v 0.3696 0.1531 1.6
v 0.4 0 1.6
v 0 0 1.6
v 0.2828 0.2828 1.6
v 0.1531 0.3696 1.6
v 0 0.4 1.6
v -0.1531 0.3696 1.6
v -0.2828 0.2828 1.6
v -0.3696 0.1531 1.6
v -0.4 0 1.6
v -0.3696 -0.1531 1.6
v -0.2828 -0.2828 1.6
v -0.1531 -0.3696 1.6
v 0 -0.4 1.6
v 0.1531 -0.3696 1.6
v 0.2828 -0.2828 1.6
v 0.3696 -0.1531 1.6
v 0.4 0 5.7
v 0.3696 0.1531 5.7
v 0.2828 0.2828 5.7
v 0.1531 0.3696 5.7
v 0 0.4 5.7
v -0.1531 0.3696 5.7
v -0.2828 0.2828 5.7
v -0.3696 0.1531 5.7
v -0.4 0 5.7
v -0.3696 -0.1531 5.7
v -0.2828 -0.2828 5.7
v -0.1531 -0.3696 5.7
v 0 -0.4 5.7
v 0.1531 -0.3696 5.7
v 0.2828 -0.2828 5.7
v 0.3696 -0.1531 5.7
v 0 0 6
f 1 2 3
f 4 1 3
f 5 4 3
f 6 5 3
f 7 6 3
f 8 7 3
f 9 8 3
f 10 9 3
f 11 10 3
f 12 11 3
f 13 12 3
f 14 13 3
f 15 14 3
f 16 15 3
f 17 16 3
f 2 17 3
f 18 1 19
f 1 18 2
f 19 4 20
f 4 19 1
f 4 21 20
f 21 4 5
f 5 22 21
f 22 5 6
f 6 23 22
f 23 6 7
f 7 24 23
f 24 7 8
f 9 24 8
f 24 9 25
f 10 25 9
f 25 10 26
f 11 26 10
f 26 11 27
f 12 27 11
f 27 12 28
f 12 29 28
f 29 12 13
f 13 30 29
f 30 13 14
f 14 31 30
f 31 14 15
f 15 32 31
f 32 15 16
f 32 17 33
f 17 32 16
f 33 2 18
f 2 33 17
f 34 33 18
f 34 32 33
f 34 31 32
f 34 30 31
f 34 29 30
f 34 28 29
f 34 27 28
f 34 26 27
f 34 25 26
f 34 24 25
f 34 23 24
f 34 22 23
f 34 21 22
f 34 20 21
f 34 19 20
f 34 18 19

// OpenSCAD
// file: ../p/4-4edge.scad
use <../lib.scad>
function ldraw_lib__4_4edge() = [
// 0 Circle 1.0
// 0 Name: 4-4edge.dat
// 0 Author: James Jessiman
// 0 !LDRAW_ORG Primitive UPDATE 2017-01
// 0 !LICENSE Licensed under CC BY 2.0 and CC BY 4.0 : see CAreadme.txt
// 
// 0 BFC CERTIFY CCW
  [0,"BFC","CERTIFY"],
  [0,"BFC","CCW"],
// 
// 0 !HISTORY 1998-12-15 [PTadmin] Official Update 1998-10
// 0 !HISTORY 2005-12-28 [PTadmin] Official Update 2005-01
// 0 !HISTORY 2007-06-24 [PTadmin] Header formatted for Contributor Agreement
// 0 !HISTORY 2008-07-01 [PTadmin] Official Update 2008-01
// 0 !HISTORY 2017-01-15 [Steffen] BFCed
// 0 !HISTORY 2017-12-30 [PTadmin] Official Update 2017-01
// 
// 
// 2 24 1 0 0 0.9239 0 0.3827
  [2,24,1,0,0,0.9239,0,0.3827],
// 2 24 0.9239 0 0.3827 0.7071 0 0.7071
  [2,24,0.9239,0,0.3827,0.7071,0,0.7071],
// 2 24 0.7071 0 0.7071 0.3827 0 0.9239
  [2,24,0.7071,0,0.7071,0.3827,0,0.9239],
// 2 24 0.3827 0 0.9239 0 0 1
  [2,24,0.3827,0,0.9239,0,0,1],
// 2 24 0 0 1 -0.3827 0 0.9239
  [2,24,0,0,1,-0.3827,0,0.9239],
// 2 24 -0.3827 0 0.9239 -0.7071 0 0.7071
  [2,24,-0.3827,0,0.9239,-0.7071,0,0.7071],
// 2 24 -0.7071 0 0.7071 -0.9239 0 0.3827
  [2,24,-0.7071,0,0.7071,-0.9239,0,0.3827],
// 2 24 -0.9239 0 0.3827 -1 0 -0
  [2,24,-0.9239,0,0.3827,-1,0,-0],
// 2 24 -1 0 -0 -0.9239 0 -0.3827
  [2,24,-1,0,-0,-0.9239,0,-0.3827],
// 2 24 -0.9239 0 -0.3827 -0.7071 0 -0.7071
  [2,24,-0.9239,0,-0.3827,-0.7071,0,-0.7071],
// 2 24 -0.7071 0 -0.7071 -0.3827 0 -0.9239
  [2,24,-0.7071,0,-0.7071,-0.3827,0,-0.9239],
// 2 24 -0.3827 0 -0.9239 0 0 -1
  [2,24,-0.3827,0,-0.9239,0,0,-1],
// 2 24 0 0 -1 0.3827 0 -0.9239
  [2,24,0,0,-1,0.3827,0,-0.9239],
// 2 24 0.3827 0 -0.9239 0.7071 0 -0.7071
  [2,24,0.3827,0,-0.9239,0.7071,0,-0.7071],
// 2 24 0.7071 0 -0.7071 0.9239 0 -0.3827
  [2,24,0.7071,0,-0.7071,0.9239,0,-0.3827],
// 2 24 0.9239 0 -0.3827 1 0 0
  [2,24,0.9239,0,-0.3827,1,0,0],
];
module ldraw_lib__4_4edge(step=0, col=false, unit=2/5, alt=false, line=0.2, solid=!$preview)
    makepoly(ldraw_lib__4_4edge(), step=step, col=col, unit=unit, alt=alt, line=line, solid=solid);
ldraw_lib__4_4edge(line=0.2);
// file: ../p/4-4disc.scad
use <../lib.scad>
function ldraw_lib__4_4disc() = [
// 0 Disc 1.0
// 0 Name: 4-4disc.dat
// 0 Author: James Jessiman
// 0 !LDRAW_ORG Primitive UPDATE 2002-02
// 0 !LICENSE Licensed under CC BY 2.0 and CC BY 4.0 : see CAreadme.txt
// 
// 0 BFC CERTIFY CCW
  [0,"BFC","CERTIFY"],
  [0,"BFC","CCW"],
// 
// 0 !HISTORY 1998-12-15 [PTadmin] Official Update 1998-10
// 0 !HISTORY 2002-03-23 [sbliss] Added BFC statement
// 0 !HISTORY 2002-04-25 [PTadmin] Official Update 2002-02
// 0 !HISTORY 2007-06-24 [PTadmin] Header formatted for Contributor Agreement
// 0 !HISTORY 2008-07-01 [PTadmin] Official Update 2008-01
// 
// 
// 3 16 0 0 0 1 0 0 0.9239 0 0.3827
  [3,16,0,0,0,1,0,0,0.9239,0,0.3827],
// 3 16 0 0 0 0.9239 0 0.3827 0.7071 0 0.7071
  [3,16,0,0,0,0.9239,0,0.3827,0.7071,0,0.7071],
// 3 16 0 0 0 0.7071 0 0.7071 0.3827 0 0.9239
  [3,16,0,0,0,0.7071,0,0.7071,0.3827,0,0.9239],
// 3 16 0 0 0 0.3827 0 0.9239 0 0 1
  [3,16,0,0,0,0.3827,0,0.9239,0,0,1],
// 3 16 0 0 0 0 0 1 -0.3827 0 0.9239
  [3,16,0,0,0,0,0,1,-0.3827,0,0.9239],
// 3 16 0 0 0 -0.3827 0 0.9239 -0.7071 0 0.7071
  [3,16,0,0,0,-0.3827,0,0.9239,-0.7071,0,0.7071],
// 3 16 0 0 0 -0.7071 0 0.7071 -0.9239 0 0.3827
  [3,16,0,0,0,-0.7071,0,0.7071,-0.9239,0,0.3827],
// 3 16 0 0 0 -0.9239 0 0.3827 -1 0 -0
  [3,16,0,0,0,-0.9239,0,0.3827,-1,0,-0],
// 3 16 0 0 0 -1 0 -0 -0.9239 0 -0.3827
  [3,16,0,0,0,-1,0,-0,-0.9239,0,-0.3827],
// 3 16 0 0 0 -0.9239 0 -0.3827 -0.7071 0 -0.7071
  [3,16,0,0,0,-0.9239,0,-0.3827,-0.7071,0,-0.7071],
// 3 16 0 0 0 -0.7071 0 -0.7071 -0.3827 0 -0.9239
  [3,16,0,0,0,-0.7071,0,-0.7071,-0.3827,0,-0.9239],
// 3 16 0 0 0 -0.3827 0 -0.9239 0 0 -1
  [3,16,0,0,0,-0.3827,0,-0.9239,0,0,-1],
// 3 16 0 0 0 0 0 -1 0.3827 0 -0.9239
  [3,16,0,0,0,0,0,-1,0.3827,0,-0.9239],
// 3 16 0 0 0 0.3827 0 -0.9239 0.7071 0 -0.7071
  [3,16,0,0,0,0.3827,0,-0.9239,0.7071,0,-0.7071],
// 3 16 0 0 0 0.7071 0 -0.7071 0.9239 0 -0.3827
  [3,16,0,0,0,0.7071,0,-0.7071,0.9239,0,-0.3827],
// 3 16 0 0 0 0.9239 0 -0.3827 1 0 0
  [3,16,0,0,0,0.9239,0,-0.3827,1,0,0],
// 0
];
module ldraw_lib__4_4disc(step=0, col=false, unit=2/5, alt=false, line=0.2, solid=!$preview)
    makepoly(ldraw_lib__4_4disc(), step=step, col=col, unit=unit, alt=alt, line=line, solid=solid);
ldraw_lib__4_4disc(line=0.2);
// file: ../p/4-4cyli.scad
use <../lib.scad>
function ldraw_lib__4_4cyli() = [
// 0 Cylinder 1.0
// 0 Name: 4-4cyli.dat
// 0 Author: James Jessiman
// 0 !LDRAW_ORG Primitive UPDATE 2005-01
// 0 !LICENSE Licensed under CC BY 2.0 and CC BY 4.0 : see CAreadme.txt
// 
// 0 BFC CERTIFY CCW
  [0,"BFC","CERTIFY"],
  [0,"BFC","CCW"],
// 
// 0 !HISTORY 1998-12-15 [PTadmin] Official Update 1998-10
// 0 !HISTORY 2002-03-23 [sbliss] Added BFC statement; merged headers from files in distributions LDraw 0.27 and Complete.
// 0 !HISTORY 2002-04-25 [PTadmin] Official Update 2002-02
// 0 !HISTORY 2004-12-14 [guyvivan] BFC CCW
// 0 !HISTORY 2005-12-28 [PTadmin] Official Update 2005-01
// 0 !HISTORY 2007-06-24 [PTadmin] Header formatted for Contributor Agreement
// 0 !HISTORY 2008-07-01 [PTadmin] Official Update 2008-01
// 
// 
// 4 16 1 1 0 0.9239 1 0.3827 0.9239 0 0.3827 1 0 0
  [4,16,1,1,0,0.9239,1,0.3827,0.9239,0,0.3827,1,0,0],
// 5 24 1 0 0 1 1 0 0.9239 0 0.3827 0.9239 0 -0.3827
  [5,24,1,0,0,1,1,0,0.9239,0,0.3827,0.9239,0,-0.3827],
// 4 16 0.9239 1 0.3827 0.7071 1 0.7071 0.7071 0 0.7071 0.9239 0 0.3827
  [4,16,0.9239,1,0.3827,0.7071,1,0.7071,0.7071,0,0.7071,0.9239,0,0.3827],
// 5 24 0.9239 0 0.3827 0.9239 1 0.3827 0.7071 0 0.7071 1 0 0
  [5,24,0.9239,0,0.3827,0.9239,1,0.3827,0.7071,0,0.7071,1,0,0],
// 4 16 0.7071 1 0.7071 0.3827 1 0.9239 0.3827 0 0.9239 0.7071 0 0.7071
  [4,16,0.7071,1,0.7071,0.3827,1,0.9239,0.3827,0,0.9239,0.7071,0,0.7071],
// 5 24 0.7071 0 0.7071 0.7071 1 0.7071 0.3827 0 0.9239 0.9239 0 0.3827
  [5,24,0.7071,0,0.7071,0.7071,1,0.7071,0.3827,0,0.9239,0.9239,0,0.3827],
// 4 16 0.3827 1 0.9239 0 1 1 0 0 1 0.3827 0 0.9239
  [4,16,0.3827,1,0.9239,0,1,1,0,0,1,0.3827,0,0.9239],
// 5 24 0.3827 0 0.9239 0.3827 1 0.9239 0 0 1 0.7071 0 0.7071
  [5,24,0.3827,0,0.9239,0.3827,1,0.9239,0,0,1,0.7071,0,0.7071],
// 4 16 0 1 1 -0.3827 1 0.9239 -0.3827 0 0.9239 0 0 1
  [4,16,0,1,1,-0.3827,1,0.9239,-0.3827,0,0.9239,0,0,1],
// 5 24 0 0 1 0 1 1 -0.3827 0 0.9239 0.3827 0 0.9239
  [5,24,0,0,1,0,1,1,-0.3827,0,0.9239,0.3827,0,0.9239],
// 4 16 -0.3827 1 0.9239 -0.7071 1 0.7071 -0.7071 0 0.7071 -0.3827 0 0.9239
  [4,16,-0.3827,1,0.9239,-0.7071,1,0.7071,-0.7071,0,0.7071,-0.3827,0,0.9239],
// 5 24 -0.3827 0 0.9239 -0.3827 1 0.9239 -0.7071 0 0.7071 0 0 1
  [5,24,-0.3827,0,0.9239,-0.3827,1,0.9239,-0.7071,0,0.7071,0,0,1],
// 4 16 -0.7071 1 0.7071 -0.9239 1 0.3827 -0.9239 0 0.3827 -0.7071 0 0.7071
  [4,16,-0.7071,1,0.7071,-0.9239,1,0.3827,-0.9239,0,0.3827,-0.7071,0,0.7071],
// 5 24 -0.7071 0 0.7071 -0.7071 1 0.7071 -0.9239 0 0.3827 -0.3827 0 0.9239
  [5,24,-0.7071,0,0.7071,-0.7071,1,0.7071,-0.9239,0,0.3827,-0.3827,0,0.9239],
// 4 16 -0.9239 1 0.3827 -1 1 0 -1 0 0 -0.9239 0 0.3827
  [4,16,-0.9239,1,0.3827,-1,1,0,-1,0,0,-0.9239,0,0.3827],
// 5 24 -0.9239 0 0.3827 -0.9239 1 0.3827 -1 0 0 -0.7071 0 0.7071
  [5,24,-0.9239,0,0.3827,-0.9239,1,0.3827,-1,0,0,-0.7071,0,0.7071],
// 4 16 -1 1 0 -0.9239 1 -0.3827 -0.9239 0 -0.3827 -1 0 0
  [4,16,-1,1,0,-0.9239,1,-0.3827,-0.9239,0,-0.3827,-1,0,0],
// 5 24 -1 0 0 -1 1 0 -0.9239 0 -0.3827 -0.9239 0 0.3827
  [5,24,-1,0,0,-1,1,0,-0.9239,0,-0.3827,-0.9239,0,0.3827],
// 4 16 -0.9239 1 -0.3827 -0.7071 1 -0.7071 -0.7071 0 -0.7071 -0.9239 0 -0.3827
  [4,16,-0.9239,1,-0.3827,-0.7071,1,-0.7071,-0.7071,0,-0.7071,-0.9239,0,-0.3827],
// 5 24 -0.9239 0 -0.3827 -0.9239 1 -0.3827 -0.7071 0 -0.7071 -1 0 0
  [5,24,-0.9239,0,-0.3827,-0.9239,1,-0.3827,-0.7071,0,-0.7071,-1,0,0],
// 4 16 -0.7071 1 -0.7071 -0.3827 1 -0.9239 -0.3827 0 -0.9239 -0.7071 0 -0.7071
  [4,16,-0.7071,1,-0.7071,-0.3827,1,-0.9239,-0.3827,0,-0.9239,-0.7071,0,-0.7071],
// 5 24 -0.7071 0 -0.7071 -0.7071 1 -0.7071 -0.3827 0 -0.9239 -0.9239 0 -0.3827
  [5,24,-0.7071,0,-0.7071,-0.7071,1,-0.7071,-0.3827,0,-0.9239,-0.9239,0,-0.3827],
// 4 16 -0.3827 1 -0.9239 0 1 -1 0 0 -1 -0.3827 0 -0.9239
  [4,16,-0.3827,1,-0.9239,0,1,-1,0,0,-1,-0.3827,0,-0.9239],
// 5 24 -0.3827 0 -0.9239 -0.3827 1 -0.9239 0 0 -1 -0.7071 0 -0.7071
  [5,24,-0.3827,0,-0.9239,-0.3827,1,-0.9239,0,0,-1,-0.7071,0,-0.7071],
// 4 16 0 1 -1 0.3827 1 -0.9239 0.3827 0 -0.9239 0 0 -1
  [4,16,0,1,-1,0.3827,1,-0.9239,0.3827,0,-0.9239,0,0,-1],
// 5 24 0 0 -1 0 1 -1 0.3827 0 -0.9239 -0.3827 0 -0.9239
  [5,24,0,0,-1,0,1,-1,0.3827,0,-0.9239,-0.3827,0,-0.9239],
// 4 16 0.3827 1 -0.9239 0.7071 1 -0.7071 0.7071 0 -0.7071 0.3827 0 -0.9239
  [4,16,0.3827,1,-0.9239,0.7071,1,-0.7071,0.7071,0,-0.7071,0.3827,0,-0.9239],
// 5 24 0.3827 0 -0.9239 0.3827 1 -0.9239 0.7071 0 -0.7071 0 0 -1
  [5,24,0.3827,0,-0.9239,0.3827,1,-0.9239,0.7071,0,-0.7071,0,0,-1],
// 4 16 0.7071 1 -0.7071 0.9239 1 -0.3827 0.9239 0 -0.3827 0.7071 0 -0.7071
  [4,16,0.7071,1,-0.7071,0.9239,1,-0.3827,0.9239,0,-0.3827,0.7071,0,-0.7071],
// 5 24 0.7071 0 -0.7071 0.7071 1 -0.7071 0.9239 0 -0.3827 0.3827 0 -0.9239
  [5,24,0.7071,0,-0.7071,0.7071,1,-0.7071,0.9239,0,-0.3827,0.3827,0,-0.9239],
// 4 16 0.9239 1 -0.3827 1 1 0 1 0 0 0.9239 0 -0.3827
  [4,16,0.9239,1,-0.3827,1,1,0,1,0,0,0.9239,0,-0.3827],
// 5 24 0.9239 0 -0.3827 0.9239 1 -0.3827 1 0 0 0.7071 0 -0.7071
  [5,24,0.9239,0,-0.3827,0.9239,1,-0.3827,1,0,0,0.7071,0,-0.7071],
// 0
];
module ldraw_lib__4_4cyli(step=0, col=false, unit=2/5, alt=false, line=0.2, solid=!$preview)
    makepoly(ldraw_lib__4_4cyli(), step=step, col=col, unit=unit, alt=alt, line=line, solid=solid);
ldraw_lib__4_4cyli(line=0.2);
// file: ../p/4-4cylc.scad
use <../lib.scad>
use <4-4cyli.scad>
use <4-4disc.scad>
use <4-4edge.scad>
function ldraw_lib__4_4cylc() = [
// 0 Cylinder Closed 1.0
// 0 Name: 4-4cylc.dat
// 0 Author: Alex Taylor [anathema]
// 0 !LDRAW_ORG Primitive UPDATE 2009-02
// 0 !LICENSE Licensed under CC BY 2.0 and CC BY 4.0 : see CAreadme.txt
// 
// 0 BFC CERTIFY CCW
  [0,"BFC","CERTIFY"],
  [0,"BFC","CCW"],
// 
// 0 !HISTORY 2008-12-29 [cwdee] Removed one disc
// 0 !HISTORY 2009-09-03 [PTadmin] Official Update 2009-02
// 
// 
// 1 16 0 0 0 1 0 0 0 1 0 0 0 1 4-4edge.dat
  [1,16,0,0,0,1,0,0,0,1,0,0,0,1, ldraw_lib__4_4edge()],
// 1 16 0 1 0 1 0 0 0 1 0 0 0 1 4-4edge.dat
  [1,16,0,1,0,1,0,0,0,1,0,0,0,1, ldraw_lib__4_4edge()],
// 1 16 0 0 0 1 0 0 0 1 0 0 0 1 4-4disc.dat
  [1,16,0,0,0,1,0,0,0,1,0,0,0,1, ldraw_lib__4_4disc()],
// 1 16 0 0 0 1 0 0 0 1 0 0 0 1 4-4cyli.dat
  [1,16,0,0,0,1,0,0,0,1,0,0,0,1, ldraw_lib__4_4cyli()],
// 0
];
module ldraw_lib__4_4cylc(step=0, col=false, unit=2/5, alt=false, line=0.2, solid=!$preview)
    makepoly(ldraw_lib__4_4cylc(), step=step, col=col, unit=unit, alt=alt, line=line, solid=solid);
ldraw_lib__4_4cylc(line=0.2);
// file: ../p/4-4con0.scad
use <../lib.scad>
function ldraw_lib__4_4con0() = [
// 0 Cone  0 x 1.0
// 0 Name: 4-4con0.dat
// 0 Author: William Howard [WilliamH]
// 0 !LDRAW_ORG Primitive UPDATE 2009-03
// 0 !LICENSE Licensed under CC BY 2.0 and CC BY 4.0 : see CAreadme.txt
// 
// 0 BFC CERTIFY CCW
  [0,"BFC","CERTIFY"],
  [0,"BFC","CCW"],
// 
// 0 !HISTORY 2009-12-29 [PTadmin] Official Update 2009-03
// 
// 
// 3 16 0 1 0 0.9239 0 0.3827 1 0 0
  [3,16,0,1,0,0.9239,0,0.3827,1,0,0],
// 3 16 0 1 0 0.7071 0 0.7071 0.9239 0 0.3827
  [3,16,0,1,0,0.7071,0,0.7071,0.9239,0,0.3827],
// 3 16 0 1 0 0.3827 0 0.9239 0.7071 0 0.7071
  [3,16,0,1,0,0.3827,0,0.9239,0.7071,0,0.7071],
// 3 16 0 1 0 0 0 1 0.3827 0 0.9239
  [3,16,0,1,0,0,0,1,0.3827,0,0.9239],
// 3 16 0 1 0 -0.3827 0 0.9239 0 0 1
  [3,16,0,1,0,-0.3827,0,0.9239,0,0,1],
// 3 16 0 1 0 -0.7071 0 0.7071 -0.3827 0 0.9239
  [3,16,0,1,0,-0.7071,0,0.7071,-0.3827,0,0.9239],
// 3 16 0 1 0 -0.9239 0 0.3827 -0.7071 0 0.7071
  [3,16,0,1,0,-0.9239,0,0.3827,-0.7071,0,0.7071],
// 3 16 0 1 0 -1 0 0 -0.9239 0 0.3827
  [3,16,0,1,0,-1,0,0,-0.9239,0,0.3827],
// 3 16 0 1 0 -0.9239 0 -0.3827 -1 0 0
  [3,16,0,1,0,-0.9239,0,-0.3827,-1,0,0],
// 3 16 0 1 0 -0.7071 0 -0.7071 -0.9239 0 -0.3827
  [3,16,0,1,0,-0.7071,0,-0.7071,-0.9239,0,-0.3827],
// 3 16 0 1 0 -0.3827 0 -0.9239 -0.7071 0 -0.7071
  [3,16,0,1,0,-0.3827,0,-0.9239,-0.7071,0,-0.7071],
// 3 16 0 1 0 0 0 -1 -0.3827 0 -0.9239
  [3,16,0,1,0,0,0,-1,-0.3827,0,-0.9239],
// 3 16 0 1 0 0.3827 0 -0.9239 0 0 -1
  [3,16,0,1,0,0.3827,0,-0.9239,0,0,-1],
// 3 16 0 1 0 0.7071 0 -0.7071 0.3827 0 -0.9239
  [3,16,0,1,0,0.7071,0,-0.7071,0.3827,0,-0.9239],
// 3 16 0 1 0 0.9239 0 -0.3827 0.7071 0 -0.7071
  [3,16,0,1,0,0.9239,0,-0.3827,0.7071,0,-0.7071],
// 3 16 0 1 0 1 0 0 0.9239 0 -0.3827
  [3,16,0,1,0,1,0,0,0.9239,0,-0.3827],
// 
// 0 conditional lines
// 5 24 0 1 0 1 0 0 0.9239 0 -0.3827 0.9239 0 0.3827
  [5,24,0,1,0,1,0,0,0.9239,0,-0.3827,0.9239,0,0.3827],
// 5 24 0 1 0 0.9239 0 0.3827 1 0 0 0.7071 0 0.7071
  [5,24,0,1,0,0.9239,0,0.3827,1,0,0,0.7071,0,0.7071],
// 5 24 0 1 0 0.7071 0 0.7071 0.9239 0 0.3827 0.3827 0 0.9239
  [5,24,0,1,0,0.7071,0,0.7071,0.9239,0,0.3827,0.3827,0,0.9239],
// 5 24 0 1 0 0.3827 0 0.9239 0.7071 0 0.7071 0 0 1
  [5,24,0,1,0,0.3827,0,0.9239,0.7071,0,0.7071,0,0,1],
// 5 24 0 1 0 0 0 1 0.3827 0 0.9239 -0.3827 0 0.9239
  [5,24,0,1,0,0,0,1,0.3827,0,0.9239,-0.3827,0,0.9239],
// 5 24 0 1 0 -0.3827 0 0.9239 0 0 1 -0.7071 0 0.7071
  [5,24,0,1,0,-0.3827,0,0.9239,0,0,1,-0.7071,0,0.7071],
// 5 24 0 1 0 -0.7071 0 0.7071 -0.3827 0 0.9239 -0.9239 0 0.3827
  [5,24,0,1,0,-0.7071,0,0.7071,-0.3827,0,0.9239,-0.9239,0,0.3827],
// 5 24 0 1 0 -0.9239 0 0.3827 -0.7071 0 0.7071 -1 0 0
  [5,24,0,1,0,-0.9239,0,0.3827,-0.7071,0,0.7071,-1,0,0],
// 5 24 0 1 0 -1 0 0 -0.9239 0 0.3827 -0.9239 0 -0.3827
  [5,24,0,1,0,-1,0,0,-0.9239,0,0.3827,-0.9239,0,-0.3827],
// 5 24 0 1 0 -0.9239 0 -0.3827 -1 0 0 -0.7071 0 -0.7071
  [5,24,0,1,0,-0.9239,0,-0.3827,-1,0,0,-0.7071,0,-0.7071],
// 5 24 0 1 0 -0.7071 0 -0.7071 -0.9239 0 -0.3827 -0.3827 0 -0.9239
  [5,24,0,1,0,-0.7071,0,-0.7071,-0.9239,0,-0.3827,-0.3827,0,-0.9239],
// 5 24 0 1 0 -0.3827 0 -0.9239 -0.7071 0 -0.7071 0 0 -1
  [5,24,0,1,0,-0.3827,0,-0.9239,-0.7071,0,-0.7071,0,0,-1],
// 5 24 0 1 0 0 0 -1 -0.3827 0 -0.9239 0.3827 0 -0.9239
  [5,24,0,1,0,0,0,-1,-0.3827,0,-0.9239,0.3827,0,-0.9239],
// 5 24 0 1 0 0.3827 0 -0.9239 0 0 -1 0.7071 0 -0.7071
  [5,24,0,1,0,0.3827,0,-0.9239,0,0,-1,0.7071,0,-0.7071],
// 5 24 0 1 0 0.7071 0 -0.7071 0.3827 0 -0.9239 0.9239 0 -0.3827
  [5,24,0,1,0,0.7071,0,-0.7071,0.3827,0,-0.9239,0.9239,0,-0.3827],
// 5 24 0 1 0 0.9239 0 -0.3827 0.7071 0 -0.7071 1 0 0
  [5,24,0,1,0,0.9239,0,-0.3827,0.7071,0,-0.7071,1,0,0],
// 
// 0 end of file
];
module ldraw_lib__4_4con0(step=0, col=false, unit=2/5, alt=false, line=0.2, solid=!$preview)
    makepoly(ldraw_lib__4_4con0(), step=step, col=col, unit=unit, alt=alt, line=line, solid=solid);
ldraw_lib__4_4con0(line=0.2);
// main file
use <../lib.scad>
use <../p/4-4con0.scad>
use <../p/4-4cylc.scad>
function ldraw_lib__70926() = [
// 0 ~Minifig Compass Base Stick
// 0 Name: 70926.dat
// 0 Author: Michael Heidemann [mikeheide]
// 0 !LDRAW_ORG Part UPDATE 2020-01
// 0 !LICENSE Licensed under CC BY 2.0 and CC BY 4.0 : see CAreadme.txt
// 
// 0 BFC CERTIFY CCW
  [0,"BFC","CERTIFY"],
  [0,"BFC","CCW"],
// 
// 0 !HISTORY 2010-07-05 [PTadmin] Official Update 2010-02
// 0 !HISTORY 2018-06-02 [MagFors] Renamed from s\889s01
// 0 !HISTORY 2020-06-28 [PTadmin] Official Update 2020-01
// 
// 
// 1 16 0 -4 0 1 0 0 0 -10.25 0 0 0 1 4-4cylc.dat
  [1,16,0,-4,0,1,0,0,0,-10.25,0,0,0,1, ldraw_lib__4_4cylc()],
// 1 16 0 -14.25 0 1 0 0 0 -.75 0 0 0 -1 4-4con0.dat
  [1,16,0,-14.25,0,1,0,0,0,-.75,0,0,0,-1, ldraw_lib__4_4con0()],
];
module ldraw_lib__70926(step=0, col=false, unit=2/5, alt=false, line=0.2, solid=!$preview)
    makepoly(ldraw_lib__70926(), step=step, col=col, unit=unit, alt=alt, line=line, solid=solid);
ldraw_lib__70926(line=0.2);
